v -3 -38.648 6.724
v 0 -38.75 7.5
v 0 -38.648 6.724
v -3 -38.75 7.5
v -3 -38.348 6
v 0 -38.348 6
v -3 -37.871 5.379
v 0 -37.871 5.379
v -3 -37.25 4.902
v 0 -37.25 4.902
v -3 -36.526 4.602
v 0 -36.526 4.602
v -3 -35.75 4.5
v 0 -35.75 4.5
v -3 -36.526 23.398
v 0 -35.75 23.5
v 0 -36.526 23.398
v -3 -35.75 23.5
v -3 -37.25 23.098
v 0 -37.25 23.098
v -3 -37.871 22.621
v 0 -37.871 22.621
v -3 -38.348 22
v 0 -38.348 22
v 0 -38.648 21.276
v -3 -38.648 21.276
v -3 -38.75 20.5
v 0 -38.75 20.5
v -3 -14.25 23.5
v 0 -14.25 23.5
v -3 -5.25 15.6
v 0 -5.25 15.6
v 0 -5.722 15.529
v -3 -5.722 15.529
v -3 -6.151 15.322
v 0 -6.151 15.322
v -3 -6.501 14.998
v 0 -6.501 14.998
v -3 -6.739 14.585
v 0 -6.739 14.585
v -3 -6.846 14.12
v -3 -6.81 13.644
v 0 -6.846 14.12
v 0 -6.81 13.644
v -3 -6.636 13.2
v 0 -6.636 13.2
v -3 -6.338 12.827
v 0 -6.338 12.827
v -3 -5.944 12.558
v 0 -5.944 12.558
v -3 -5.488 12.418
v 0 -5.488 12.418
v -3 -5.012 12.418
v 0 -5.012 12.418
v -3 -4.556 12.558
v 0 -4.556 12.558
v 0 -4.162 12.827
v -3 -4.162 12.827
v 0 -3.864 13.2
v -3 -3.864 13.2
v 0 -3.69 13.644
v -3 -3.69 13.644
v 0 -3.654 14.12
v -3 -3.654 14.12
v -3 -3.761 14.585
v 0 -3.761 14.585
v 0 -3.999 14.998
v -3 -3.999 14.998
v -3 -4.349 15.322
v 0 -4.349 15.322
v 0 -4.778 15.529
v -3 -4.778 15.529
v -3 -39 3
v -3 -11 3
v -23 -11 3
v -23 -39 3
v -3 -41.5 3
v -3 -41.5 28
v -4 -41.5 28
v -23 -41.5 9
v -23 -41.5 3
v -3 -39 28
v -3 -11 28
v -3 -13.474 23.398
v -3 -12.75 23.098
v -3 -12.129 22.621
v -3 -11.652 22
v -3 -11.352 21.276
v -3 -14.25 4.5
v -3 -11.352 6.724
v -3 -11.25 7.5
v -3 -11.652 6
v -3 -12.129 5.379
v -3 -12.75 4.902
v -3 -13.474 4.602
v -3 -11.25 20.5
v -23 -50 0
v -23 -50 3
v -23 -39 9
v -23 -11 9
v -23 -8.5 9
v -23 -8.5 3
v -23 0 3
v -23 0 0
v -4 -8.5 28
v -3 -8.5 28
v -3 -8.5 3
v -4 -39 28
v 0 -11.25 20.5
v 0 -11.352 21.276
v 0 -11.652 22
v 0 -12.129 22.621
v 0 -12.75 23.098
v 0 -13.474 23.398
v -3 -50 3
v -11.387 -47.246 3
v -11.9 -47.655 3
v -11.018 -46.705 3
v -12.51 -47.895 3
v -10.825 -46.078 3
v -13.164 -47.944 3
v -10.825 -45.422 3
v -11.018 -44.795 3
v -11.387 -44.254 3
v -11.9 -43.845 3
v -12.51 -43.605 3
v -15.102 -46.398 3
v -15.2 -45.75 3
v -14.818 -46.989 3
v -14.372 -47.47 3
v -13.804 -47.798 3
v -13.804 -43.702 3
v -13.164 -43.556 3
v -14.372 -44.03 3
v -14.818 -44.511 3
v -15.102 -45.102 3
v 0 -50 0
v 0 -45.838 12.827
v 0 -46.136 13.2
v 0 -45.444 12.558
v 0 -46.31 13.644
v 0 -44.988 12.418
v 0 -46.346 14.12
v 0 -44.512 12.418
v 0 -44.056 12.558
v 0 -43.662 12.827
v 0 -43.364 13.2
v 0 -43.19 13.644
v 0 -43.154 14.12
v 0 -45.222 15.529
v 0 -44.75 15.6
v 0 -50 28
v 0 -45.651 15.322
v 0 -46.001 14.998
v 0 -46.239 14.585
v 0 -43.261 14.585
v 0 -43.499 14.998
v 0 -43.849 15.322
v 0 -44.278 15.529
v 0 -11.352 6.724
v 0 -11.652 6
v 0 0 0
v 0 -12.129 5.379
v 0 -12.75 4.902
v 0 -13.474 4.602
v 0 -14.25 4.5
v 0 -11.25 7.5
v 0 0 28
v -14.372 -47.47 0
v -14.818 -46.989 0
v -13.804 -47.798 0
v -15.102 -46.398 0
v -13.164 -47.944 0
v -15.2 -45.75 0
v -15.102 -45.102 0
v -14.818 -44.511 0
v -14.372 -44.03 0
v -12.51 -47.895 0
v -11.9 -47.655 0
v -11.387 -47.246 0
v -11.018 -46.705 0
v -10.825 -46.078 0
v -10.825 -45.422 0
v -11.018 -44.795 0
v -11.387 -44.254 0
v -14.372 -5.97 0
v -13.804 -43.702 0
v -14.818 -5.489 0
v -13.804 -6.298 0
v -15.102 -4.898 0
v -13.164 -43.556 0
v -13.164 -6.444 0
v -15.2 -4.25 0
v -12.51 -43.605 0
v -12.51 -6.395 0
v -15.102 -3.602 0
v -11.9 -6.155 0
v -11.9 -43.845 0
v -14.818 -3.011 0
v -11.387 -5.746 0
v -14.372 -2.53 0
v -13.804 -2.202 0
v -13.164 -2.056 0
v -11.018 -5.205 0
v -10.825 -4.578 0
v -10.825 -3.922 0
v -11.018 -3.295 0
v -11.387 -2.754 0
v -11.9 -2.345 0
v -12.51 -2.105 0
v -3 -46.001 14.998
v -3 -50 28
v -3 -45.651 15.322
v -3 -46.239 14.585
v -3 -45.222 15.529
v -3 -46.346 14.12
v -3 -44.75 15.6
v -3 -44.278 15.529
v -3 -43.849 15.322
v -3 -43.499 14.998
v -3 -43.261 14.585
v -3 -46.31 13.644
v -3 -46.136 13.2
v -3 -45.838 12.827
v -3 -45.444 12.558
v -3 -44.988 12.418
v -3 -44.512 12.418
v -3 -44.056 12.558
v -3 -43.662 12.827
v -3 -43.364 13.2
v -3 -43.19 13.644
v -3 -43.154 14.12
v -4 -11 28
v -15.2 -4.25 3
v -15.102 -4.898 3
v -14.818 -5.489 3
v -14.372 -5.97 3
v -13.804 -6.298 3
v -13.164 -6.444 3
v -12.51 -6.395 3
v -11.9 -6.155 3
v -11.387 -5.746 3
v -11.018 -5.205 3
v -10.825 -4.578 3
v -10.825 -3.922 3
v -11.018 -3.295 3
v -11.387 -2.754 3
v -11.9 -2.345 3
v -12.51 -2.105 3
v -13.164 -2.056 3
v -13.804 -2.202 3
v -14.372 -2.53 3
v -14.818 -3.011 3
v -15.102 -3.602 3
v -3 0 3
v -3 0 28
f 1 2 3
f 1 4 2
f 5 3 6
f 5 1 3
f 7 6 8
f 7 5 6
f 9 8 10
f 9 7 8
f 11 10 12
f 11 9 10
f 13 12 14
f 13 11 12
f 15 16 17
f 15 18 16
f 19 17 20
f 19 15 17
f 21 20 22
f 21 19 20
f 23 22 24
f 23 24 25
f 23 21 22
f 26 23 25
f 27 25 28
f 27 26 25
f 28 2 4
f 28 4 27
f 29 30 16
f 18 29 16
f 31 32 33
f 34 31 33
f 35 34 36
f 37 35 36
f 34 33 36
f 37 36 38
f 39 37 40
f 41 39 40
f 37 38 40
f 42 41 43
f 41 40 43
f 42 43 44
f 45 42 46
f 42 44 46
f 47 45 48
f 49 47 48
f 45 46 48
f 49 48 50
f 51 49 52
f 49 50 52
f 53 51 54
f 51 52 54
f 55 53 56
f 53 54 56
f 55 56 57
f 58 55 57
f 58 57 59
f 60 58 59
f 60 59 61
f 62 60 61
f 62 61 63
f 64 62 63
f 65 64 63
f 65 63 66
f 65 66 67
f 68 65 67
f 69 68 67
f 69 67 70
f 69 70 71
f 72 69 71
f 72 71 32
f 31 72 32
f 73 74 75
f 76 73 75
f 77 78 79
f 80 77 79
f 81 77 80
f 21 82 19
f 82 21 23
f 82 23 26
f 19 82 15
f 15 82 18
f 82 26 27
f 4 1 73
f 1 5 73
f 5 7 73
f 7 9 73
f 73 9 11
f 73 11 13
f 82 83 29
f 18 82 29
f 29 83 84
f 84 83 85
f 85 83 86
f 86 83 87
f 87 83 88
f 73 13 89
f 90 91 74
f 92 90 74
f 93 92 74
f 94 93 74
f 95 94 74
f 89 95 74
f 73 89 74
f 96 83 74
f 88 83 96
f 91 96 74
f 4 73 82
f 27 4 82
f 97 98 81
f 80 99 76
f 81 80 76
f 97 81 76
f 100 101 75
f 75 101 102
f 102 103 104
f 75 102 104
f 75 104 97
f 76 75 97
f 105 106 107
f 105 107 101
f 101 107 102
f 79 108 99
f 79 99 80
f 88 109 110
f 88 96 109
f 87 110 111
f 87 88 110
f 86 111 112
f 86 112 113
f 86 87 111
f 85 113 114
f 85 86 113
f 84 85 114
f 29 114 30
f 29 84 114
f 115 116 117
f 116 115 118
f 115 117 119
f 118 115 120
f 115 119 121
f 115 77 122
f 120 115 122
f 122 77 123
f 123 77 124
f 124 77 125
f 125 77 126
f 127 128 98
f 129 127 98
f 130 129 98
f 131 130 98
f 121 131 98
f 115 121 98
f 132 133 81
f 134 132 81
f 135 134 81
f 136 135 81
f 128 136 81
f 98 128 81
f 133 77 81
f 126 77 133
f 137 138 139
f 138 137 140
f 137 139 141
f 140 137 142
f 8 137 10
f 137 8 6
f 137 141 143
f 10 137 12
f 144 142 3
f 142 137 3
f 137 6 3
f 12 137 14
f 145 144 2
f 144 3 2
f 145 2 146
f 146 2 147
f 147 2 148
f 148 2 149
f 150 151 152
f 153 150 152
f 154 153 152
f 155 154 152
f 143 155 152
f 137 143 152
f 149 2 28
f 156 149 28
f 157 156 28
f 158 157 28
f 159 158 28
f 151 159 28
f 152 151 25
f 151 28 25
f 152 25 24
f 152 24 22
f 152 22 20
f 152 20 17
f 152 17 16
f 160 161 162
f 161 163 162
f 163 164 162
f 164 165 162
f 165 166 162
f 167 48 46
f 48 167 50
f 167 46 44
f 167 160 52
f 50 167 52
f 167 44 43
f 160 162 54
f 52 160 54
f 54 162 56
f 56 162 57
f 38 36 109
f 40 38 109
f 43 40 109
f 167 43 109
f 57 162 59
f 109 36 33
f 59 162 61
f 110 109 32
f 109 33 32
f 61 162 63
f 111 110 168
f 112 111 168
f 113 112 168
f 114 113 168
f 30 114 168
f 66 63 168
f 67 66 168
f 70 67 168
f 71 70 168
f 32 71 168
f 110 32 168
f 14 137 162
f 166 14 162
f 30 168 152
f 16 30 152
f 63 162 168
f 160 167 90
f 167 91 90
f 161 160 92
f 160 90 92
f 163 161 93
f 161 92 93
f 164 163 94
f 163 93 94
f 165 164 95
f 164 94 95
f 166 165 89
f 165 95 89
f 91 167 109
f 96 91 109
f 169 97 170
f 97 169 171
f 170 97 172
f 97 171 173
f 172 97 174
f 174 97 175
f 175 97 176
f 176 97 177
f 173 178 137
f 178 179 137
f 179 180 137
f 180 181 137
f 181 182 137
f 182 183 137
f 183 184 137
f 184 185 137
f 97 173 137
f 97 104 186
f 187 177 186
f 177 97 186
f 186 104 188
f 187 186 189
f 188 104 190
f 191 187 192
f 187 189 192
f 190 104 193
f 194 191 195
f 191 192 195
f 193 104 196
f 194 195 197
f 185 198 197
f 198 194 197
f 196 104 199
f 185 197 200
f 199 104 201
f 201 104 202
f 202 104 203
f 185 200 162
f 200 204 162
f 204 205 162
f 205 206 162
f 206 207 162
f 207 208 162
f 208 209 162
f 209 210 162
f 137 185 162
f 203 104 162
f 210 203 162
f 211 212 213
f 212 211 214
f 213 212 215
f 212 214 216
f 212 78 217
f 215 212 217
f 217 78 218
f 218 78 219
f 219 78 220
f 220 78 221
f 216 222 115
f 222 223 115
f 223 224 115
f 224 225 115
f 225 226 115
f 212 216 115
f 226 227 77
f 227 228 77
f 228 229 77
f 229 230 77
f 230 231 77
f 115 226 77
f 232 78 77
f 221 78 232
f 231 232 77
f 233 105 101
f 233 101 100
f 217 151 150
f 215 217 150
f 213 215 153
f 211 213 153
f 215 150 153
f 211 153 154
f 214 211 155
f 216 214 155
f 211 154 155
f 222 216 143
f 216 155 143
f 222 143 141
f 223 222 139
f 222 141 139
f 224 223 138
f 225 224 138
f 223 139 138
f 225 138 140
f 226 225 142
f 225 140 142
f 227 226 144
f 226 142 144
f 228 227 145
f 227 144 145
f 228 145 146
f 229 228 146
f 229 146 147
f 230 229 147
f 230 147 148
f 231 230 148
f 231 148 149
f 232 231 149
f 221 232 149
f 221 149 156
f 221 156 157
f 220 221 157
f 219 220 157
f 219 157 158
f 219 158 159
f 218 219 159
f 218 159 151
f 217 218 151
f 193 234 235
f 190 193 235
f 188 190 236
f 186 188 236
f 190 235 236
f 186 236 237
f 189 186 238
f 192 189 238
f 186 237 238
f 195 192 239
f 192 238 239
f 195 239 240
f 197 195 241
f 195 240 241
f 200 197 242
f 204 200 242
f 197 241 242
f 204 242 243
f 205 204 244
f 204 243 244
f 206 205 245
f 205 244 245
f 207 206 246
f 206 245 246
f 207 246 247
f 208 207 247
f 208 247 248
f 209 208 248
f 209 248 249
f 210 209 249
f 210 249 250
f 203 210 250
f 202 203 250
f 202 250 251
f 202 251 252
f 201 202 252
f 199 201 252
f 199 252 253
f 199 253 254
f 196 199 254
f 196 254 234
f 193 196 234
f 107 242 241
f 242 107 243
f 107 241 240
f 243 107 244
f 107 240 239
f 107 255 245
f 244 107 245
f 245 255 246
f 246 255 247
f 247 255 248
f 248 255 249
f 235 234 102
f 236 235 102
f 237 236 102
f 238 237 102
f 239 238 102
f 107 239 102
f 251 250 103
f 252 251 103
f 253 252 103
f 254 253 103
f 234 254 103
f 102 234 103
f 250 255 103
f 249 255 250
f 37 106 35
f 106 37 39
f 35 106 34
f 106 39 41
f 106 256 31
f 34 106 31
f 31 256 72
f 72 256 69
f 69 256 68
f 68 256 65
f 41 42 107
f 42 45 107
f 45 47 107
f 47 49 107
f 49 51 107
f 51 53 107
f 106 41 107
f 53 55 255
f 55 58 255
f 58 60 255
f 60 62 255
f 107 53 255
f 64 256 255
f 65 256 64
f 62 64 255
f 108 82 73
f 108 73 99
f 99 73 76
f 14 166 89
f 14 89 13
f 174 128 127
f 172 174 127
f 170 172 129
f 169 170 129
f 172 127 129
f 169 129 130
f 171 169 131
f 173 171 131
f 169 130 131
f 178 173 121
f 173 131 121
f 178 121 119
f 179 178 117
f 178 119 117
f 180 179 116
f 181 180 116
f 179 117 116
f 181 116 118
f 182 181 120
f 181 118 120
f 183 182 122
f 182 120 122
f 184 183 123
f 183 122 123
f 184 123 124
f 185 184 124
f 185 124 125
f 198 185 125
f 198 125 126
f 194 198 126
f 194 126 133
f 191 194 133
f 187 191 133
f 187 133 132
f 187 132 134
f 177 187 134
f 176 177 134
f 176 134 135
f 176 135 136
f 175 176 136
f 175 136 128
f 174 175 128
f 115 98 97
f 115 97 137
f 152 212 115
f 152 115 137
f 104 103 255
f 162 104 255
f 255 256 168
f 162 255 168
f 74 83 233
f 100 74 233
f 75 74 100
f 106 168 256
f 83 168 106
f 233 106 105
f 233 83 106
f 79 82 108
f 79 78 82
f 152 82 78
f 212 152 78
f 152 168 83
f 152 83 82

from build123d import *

# Parameters (mm, degrees)
PAD_DEPTH    = 50
SKETCH003_W  = 20
SKETCH003_H  = 2.5
PAD001_DEPTH = 25
CHAMFER_SIZE = 19
SKETCH004_R  = 1.6
SKETCH004_W  = 19
SKETCH004_H  = 27.5
POCKET_DEPTH = 23.001
FILLET_R     = 3
SKETCH005_R  = 2.2
HOLE_DEPTH   = 25


with BuildPart() as part:
    # Sketch → Pad (new body)
    with BuildSketch(Plane.XZ):
        Polygon((-23, 3), (-23, 0), (0, 0), (0, 28), (-3, 28), (-3, 3), align=None)
    extrude(amount=PAD_DEPTH)

    # Sketch003 (on Face6 of Pad) → Pad001 (join)
    with BuildSketch(Plane(origin=(0, 0, 3), x_dir=(-1, 0, 0), z_dir=(0, 0, 1))):
        with Locations((13, 40.25)):
            Rectangle(SKETCH003_W, SKETCH003_H)
        with Locations((13, 9.75)):
            Rectangle(SKETCH003_W, SKETCH003_H)
    extrude(amount=PAD001_DEPTH)

    # Chamfer
    chamfer_edges = [part.edges().sort_by_distance(p)[0] for p in [
        (-23, -40.25, 28),
        (-23, -9.75, 28),
    ]]
    chamfer(chamfer_edges, length=CHAMFER_SIZE)

    # Sketch004 (on Face21 of Chamfer) → Pocket (cut, through all)
    with BuildSketch(Plane(origin=(0, 0, 0), x_dir=(0, 0, 1), z_dir=(1, 0, 0))):
        with Locations((14, 44.75)):
            Circle(SKETCH004_R)
        with Locations((14, 5.25)):
            Circle(SKETCH004_R)
        with Locations((14, 25)):
            Rectangle(SKETCH004_W, SKETCH004_H)
    extrude(amount=-POCKET_DEPTH, mode=Mode.SUBTRACT)

    # Fillet
    fillet_edges = [part.edges().sort_by_distance(p)[0] for p in [
        (-1.5, -11.25, 4.5),
        (-1.5, -11.25, 23.5),
        (-1.5, -38.75, 4.5),
        (-1.5, -38.75, 23.5),
    ]]
    fillet(fillet_edges, radius=FILLET_R)

    # Sketch005 (on Face9 of Pocket) → Hole (cut)
    with BuildSketch(Plane(origin=(0, 0, 3), x_dir=(-1, 0, 0), z_dir=(0, 0, 1))):
        with Locations((13, 4.25)):
            Circle(SKETCH005_R)
        with Locations((13, 45.75)):
            Circle(SKETCH005_R)
    extrude(amount=-HOLE_DEPTH, mode=Mode.SUBTRACT)


solid = part.part
